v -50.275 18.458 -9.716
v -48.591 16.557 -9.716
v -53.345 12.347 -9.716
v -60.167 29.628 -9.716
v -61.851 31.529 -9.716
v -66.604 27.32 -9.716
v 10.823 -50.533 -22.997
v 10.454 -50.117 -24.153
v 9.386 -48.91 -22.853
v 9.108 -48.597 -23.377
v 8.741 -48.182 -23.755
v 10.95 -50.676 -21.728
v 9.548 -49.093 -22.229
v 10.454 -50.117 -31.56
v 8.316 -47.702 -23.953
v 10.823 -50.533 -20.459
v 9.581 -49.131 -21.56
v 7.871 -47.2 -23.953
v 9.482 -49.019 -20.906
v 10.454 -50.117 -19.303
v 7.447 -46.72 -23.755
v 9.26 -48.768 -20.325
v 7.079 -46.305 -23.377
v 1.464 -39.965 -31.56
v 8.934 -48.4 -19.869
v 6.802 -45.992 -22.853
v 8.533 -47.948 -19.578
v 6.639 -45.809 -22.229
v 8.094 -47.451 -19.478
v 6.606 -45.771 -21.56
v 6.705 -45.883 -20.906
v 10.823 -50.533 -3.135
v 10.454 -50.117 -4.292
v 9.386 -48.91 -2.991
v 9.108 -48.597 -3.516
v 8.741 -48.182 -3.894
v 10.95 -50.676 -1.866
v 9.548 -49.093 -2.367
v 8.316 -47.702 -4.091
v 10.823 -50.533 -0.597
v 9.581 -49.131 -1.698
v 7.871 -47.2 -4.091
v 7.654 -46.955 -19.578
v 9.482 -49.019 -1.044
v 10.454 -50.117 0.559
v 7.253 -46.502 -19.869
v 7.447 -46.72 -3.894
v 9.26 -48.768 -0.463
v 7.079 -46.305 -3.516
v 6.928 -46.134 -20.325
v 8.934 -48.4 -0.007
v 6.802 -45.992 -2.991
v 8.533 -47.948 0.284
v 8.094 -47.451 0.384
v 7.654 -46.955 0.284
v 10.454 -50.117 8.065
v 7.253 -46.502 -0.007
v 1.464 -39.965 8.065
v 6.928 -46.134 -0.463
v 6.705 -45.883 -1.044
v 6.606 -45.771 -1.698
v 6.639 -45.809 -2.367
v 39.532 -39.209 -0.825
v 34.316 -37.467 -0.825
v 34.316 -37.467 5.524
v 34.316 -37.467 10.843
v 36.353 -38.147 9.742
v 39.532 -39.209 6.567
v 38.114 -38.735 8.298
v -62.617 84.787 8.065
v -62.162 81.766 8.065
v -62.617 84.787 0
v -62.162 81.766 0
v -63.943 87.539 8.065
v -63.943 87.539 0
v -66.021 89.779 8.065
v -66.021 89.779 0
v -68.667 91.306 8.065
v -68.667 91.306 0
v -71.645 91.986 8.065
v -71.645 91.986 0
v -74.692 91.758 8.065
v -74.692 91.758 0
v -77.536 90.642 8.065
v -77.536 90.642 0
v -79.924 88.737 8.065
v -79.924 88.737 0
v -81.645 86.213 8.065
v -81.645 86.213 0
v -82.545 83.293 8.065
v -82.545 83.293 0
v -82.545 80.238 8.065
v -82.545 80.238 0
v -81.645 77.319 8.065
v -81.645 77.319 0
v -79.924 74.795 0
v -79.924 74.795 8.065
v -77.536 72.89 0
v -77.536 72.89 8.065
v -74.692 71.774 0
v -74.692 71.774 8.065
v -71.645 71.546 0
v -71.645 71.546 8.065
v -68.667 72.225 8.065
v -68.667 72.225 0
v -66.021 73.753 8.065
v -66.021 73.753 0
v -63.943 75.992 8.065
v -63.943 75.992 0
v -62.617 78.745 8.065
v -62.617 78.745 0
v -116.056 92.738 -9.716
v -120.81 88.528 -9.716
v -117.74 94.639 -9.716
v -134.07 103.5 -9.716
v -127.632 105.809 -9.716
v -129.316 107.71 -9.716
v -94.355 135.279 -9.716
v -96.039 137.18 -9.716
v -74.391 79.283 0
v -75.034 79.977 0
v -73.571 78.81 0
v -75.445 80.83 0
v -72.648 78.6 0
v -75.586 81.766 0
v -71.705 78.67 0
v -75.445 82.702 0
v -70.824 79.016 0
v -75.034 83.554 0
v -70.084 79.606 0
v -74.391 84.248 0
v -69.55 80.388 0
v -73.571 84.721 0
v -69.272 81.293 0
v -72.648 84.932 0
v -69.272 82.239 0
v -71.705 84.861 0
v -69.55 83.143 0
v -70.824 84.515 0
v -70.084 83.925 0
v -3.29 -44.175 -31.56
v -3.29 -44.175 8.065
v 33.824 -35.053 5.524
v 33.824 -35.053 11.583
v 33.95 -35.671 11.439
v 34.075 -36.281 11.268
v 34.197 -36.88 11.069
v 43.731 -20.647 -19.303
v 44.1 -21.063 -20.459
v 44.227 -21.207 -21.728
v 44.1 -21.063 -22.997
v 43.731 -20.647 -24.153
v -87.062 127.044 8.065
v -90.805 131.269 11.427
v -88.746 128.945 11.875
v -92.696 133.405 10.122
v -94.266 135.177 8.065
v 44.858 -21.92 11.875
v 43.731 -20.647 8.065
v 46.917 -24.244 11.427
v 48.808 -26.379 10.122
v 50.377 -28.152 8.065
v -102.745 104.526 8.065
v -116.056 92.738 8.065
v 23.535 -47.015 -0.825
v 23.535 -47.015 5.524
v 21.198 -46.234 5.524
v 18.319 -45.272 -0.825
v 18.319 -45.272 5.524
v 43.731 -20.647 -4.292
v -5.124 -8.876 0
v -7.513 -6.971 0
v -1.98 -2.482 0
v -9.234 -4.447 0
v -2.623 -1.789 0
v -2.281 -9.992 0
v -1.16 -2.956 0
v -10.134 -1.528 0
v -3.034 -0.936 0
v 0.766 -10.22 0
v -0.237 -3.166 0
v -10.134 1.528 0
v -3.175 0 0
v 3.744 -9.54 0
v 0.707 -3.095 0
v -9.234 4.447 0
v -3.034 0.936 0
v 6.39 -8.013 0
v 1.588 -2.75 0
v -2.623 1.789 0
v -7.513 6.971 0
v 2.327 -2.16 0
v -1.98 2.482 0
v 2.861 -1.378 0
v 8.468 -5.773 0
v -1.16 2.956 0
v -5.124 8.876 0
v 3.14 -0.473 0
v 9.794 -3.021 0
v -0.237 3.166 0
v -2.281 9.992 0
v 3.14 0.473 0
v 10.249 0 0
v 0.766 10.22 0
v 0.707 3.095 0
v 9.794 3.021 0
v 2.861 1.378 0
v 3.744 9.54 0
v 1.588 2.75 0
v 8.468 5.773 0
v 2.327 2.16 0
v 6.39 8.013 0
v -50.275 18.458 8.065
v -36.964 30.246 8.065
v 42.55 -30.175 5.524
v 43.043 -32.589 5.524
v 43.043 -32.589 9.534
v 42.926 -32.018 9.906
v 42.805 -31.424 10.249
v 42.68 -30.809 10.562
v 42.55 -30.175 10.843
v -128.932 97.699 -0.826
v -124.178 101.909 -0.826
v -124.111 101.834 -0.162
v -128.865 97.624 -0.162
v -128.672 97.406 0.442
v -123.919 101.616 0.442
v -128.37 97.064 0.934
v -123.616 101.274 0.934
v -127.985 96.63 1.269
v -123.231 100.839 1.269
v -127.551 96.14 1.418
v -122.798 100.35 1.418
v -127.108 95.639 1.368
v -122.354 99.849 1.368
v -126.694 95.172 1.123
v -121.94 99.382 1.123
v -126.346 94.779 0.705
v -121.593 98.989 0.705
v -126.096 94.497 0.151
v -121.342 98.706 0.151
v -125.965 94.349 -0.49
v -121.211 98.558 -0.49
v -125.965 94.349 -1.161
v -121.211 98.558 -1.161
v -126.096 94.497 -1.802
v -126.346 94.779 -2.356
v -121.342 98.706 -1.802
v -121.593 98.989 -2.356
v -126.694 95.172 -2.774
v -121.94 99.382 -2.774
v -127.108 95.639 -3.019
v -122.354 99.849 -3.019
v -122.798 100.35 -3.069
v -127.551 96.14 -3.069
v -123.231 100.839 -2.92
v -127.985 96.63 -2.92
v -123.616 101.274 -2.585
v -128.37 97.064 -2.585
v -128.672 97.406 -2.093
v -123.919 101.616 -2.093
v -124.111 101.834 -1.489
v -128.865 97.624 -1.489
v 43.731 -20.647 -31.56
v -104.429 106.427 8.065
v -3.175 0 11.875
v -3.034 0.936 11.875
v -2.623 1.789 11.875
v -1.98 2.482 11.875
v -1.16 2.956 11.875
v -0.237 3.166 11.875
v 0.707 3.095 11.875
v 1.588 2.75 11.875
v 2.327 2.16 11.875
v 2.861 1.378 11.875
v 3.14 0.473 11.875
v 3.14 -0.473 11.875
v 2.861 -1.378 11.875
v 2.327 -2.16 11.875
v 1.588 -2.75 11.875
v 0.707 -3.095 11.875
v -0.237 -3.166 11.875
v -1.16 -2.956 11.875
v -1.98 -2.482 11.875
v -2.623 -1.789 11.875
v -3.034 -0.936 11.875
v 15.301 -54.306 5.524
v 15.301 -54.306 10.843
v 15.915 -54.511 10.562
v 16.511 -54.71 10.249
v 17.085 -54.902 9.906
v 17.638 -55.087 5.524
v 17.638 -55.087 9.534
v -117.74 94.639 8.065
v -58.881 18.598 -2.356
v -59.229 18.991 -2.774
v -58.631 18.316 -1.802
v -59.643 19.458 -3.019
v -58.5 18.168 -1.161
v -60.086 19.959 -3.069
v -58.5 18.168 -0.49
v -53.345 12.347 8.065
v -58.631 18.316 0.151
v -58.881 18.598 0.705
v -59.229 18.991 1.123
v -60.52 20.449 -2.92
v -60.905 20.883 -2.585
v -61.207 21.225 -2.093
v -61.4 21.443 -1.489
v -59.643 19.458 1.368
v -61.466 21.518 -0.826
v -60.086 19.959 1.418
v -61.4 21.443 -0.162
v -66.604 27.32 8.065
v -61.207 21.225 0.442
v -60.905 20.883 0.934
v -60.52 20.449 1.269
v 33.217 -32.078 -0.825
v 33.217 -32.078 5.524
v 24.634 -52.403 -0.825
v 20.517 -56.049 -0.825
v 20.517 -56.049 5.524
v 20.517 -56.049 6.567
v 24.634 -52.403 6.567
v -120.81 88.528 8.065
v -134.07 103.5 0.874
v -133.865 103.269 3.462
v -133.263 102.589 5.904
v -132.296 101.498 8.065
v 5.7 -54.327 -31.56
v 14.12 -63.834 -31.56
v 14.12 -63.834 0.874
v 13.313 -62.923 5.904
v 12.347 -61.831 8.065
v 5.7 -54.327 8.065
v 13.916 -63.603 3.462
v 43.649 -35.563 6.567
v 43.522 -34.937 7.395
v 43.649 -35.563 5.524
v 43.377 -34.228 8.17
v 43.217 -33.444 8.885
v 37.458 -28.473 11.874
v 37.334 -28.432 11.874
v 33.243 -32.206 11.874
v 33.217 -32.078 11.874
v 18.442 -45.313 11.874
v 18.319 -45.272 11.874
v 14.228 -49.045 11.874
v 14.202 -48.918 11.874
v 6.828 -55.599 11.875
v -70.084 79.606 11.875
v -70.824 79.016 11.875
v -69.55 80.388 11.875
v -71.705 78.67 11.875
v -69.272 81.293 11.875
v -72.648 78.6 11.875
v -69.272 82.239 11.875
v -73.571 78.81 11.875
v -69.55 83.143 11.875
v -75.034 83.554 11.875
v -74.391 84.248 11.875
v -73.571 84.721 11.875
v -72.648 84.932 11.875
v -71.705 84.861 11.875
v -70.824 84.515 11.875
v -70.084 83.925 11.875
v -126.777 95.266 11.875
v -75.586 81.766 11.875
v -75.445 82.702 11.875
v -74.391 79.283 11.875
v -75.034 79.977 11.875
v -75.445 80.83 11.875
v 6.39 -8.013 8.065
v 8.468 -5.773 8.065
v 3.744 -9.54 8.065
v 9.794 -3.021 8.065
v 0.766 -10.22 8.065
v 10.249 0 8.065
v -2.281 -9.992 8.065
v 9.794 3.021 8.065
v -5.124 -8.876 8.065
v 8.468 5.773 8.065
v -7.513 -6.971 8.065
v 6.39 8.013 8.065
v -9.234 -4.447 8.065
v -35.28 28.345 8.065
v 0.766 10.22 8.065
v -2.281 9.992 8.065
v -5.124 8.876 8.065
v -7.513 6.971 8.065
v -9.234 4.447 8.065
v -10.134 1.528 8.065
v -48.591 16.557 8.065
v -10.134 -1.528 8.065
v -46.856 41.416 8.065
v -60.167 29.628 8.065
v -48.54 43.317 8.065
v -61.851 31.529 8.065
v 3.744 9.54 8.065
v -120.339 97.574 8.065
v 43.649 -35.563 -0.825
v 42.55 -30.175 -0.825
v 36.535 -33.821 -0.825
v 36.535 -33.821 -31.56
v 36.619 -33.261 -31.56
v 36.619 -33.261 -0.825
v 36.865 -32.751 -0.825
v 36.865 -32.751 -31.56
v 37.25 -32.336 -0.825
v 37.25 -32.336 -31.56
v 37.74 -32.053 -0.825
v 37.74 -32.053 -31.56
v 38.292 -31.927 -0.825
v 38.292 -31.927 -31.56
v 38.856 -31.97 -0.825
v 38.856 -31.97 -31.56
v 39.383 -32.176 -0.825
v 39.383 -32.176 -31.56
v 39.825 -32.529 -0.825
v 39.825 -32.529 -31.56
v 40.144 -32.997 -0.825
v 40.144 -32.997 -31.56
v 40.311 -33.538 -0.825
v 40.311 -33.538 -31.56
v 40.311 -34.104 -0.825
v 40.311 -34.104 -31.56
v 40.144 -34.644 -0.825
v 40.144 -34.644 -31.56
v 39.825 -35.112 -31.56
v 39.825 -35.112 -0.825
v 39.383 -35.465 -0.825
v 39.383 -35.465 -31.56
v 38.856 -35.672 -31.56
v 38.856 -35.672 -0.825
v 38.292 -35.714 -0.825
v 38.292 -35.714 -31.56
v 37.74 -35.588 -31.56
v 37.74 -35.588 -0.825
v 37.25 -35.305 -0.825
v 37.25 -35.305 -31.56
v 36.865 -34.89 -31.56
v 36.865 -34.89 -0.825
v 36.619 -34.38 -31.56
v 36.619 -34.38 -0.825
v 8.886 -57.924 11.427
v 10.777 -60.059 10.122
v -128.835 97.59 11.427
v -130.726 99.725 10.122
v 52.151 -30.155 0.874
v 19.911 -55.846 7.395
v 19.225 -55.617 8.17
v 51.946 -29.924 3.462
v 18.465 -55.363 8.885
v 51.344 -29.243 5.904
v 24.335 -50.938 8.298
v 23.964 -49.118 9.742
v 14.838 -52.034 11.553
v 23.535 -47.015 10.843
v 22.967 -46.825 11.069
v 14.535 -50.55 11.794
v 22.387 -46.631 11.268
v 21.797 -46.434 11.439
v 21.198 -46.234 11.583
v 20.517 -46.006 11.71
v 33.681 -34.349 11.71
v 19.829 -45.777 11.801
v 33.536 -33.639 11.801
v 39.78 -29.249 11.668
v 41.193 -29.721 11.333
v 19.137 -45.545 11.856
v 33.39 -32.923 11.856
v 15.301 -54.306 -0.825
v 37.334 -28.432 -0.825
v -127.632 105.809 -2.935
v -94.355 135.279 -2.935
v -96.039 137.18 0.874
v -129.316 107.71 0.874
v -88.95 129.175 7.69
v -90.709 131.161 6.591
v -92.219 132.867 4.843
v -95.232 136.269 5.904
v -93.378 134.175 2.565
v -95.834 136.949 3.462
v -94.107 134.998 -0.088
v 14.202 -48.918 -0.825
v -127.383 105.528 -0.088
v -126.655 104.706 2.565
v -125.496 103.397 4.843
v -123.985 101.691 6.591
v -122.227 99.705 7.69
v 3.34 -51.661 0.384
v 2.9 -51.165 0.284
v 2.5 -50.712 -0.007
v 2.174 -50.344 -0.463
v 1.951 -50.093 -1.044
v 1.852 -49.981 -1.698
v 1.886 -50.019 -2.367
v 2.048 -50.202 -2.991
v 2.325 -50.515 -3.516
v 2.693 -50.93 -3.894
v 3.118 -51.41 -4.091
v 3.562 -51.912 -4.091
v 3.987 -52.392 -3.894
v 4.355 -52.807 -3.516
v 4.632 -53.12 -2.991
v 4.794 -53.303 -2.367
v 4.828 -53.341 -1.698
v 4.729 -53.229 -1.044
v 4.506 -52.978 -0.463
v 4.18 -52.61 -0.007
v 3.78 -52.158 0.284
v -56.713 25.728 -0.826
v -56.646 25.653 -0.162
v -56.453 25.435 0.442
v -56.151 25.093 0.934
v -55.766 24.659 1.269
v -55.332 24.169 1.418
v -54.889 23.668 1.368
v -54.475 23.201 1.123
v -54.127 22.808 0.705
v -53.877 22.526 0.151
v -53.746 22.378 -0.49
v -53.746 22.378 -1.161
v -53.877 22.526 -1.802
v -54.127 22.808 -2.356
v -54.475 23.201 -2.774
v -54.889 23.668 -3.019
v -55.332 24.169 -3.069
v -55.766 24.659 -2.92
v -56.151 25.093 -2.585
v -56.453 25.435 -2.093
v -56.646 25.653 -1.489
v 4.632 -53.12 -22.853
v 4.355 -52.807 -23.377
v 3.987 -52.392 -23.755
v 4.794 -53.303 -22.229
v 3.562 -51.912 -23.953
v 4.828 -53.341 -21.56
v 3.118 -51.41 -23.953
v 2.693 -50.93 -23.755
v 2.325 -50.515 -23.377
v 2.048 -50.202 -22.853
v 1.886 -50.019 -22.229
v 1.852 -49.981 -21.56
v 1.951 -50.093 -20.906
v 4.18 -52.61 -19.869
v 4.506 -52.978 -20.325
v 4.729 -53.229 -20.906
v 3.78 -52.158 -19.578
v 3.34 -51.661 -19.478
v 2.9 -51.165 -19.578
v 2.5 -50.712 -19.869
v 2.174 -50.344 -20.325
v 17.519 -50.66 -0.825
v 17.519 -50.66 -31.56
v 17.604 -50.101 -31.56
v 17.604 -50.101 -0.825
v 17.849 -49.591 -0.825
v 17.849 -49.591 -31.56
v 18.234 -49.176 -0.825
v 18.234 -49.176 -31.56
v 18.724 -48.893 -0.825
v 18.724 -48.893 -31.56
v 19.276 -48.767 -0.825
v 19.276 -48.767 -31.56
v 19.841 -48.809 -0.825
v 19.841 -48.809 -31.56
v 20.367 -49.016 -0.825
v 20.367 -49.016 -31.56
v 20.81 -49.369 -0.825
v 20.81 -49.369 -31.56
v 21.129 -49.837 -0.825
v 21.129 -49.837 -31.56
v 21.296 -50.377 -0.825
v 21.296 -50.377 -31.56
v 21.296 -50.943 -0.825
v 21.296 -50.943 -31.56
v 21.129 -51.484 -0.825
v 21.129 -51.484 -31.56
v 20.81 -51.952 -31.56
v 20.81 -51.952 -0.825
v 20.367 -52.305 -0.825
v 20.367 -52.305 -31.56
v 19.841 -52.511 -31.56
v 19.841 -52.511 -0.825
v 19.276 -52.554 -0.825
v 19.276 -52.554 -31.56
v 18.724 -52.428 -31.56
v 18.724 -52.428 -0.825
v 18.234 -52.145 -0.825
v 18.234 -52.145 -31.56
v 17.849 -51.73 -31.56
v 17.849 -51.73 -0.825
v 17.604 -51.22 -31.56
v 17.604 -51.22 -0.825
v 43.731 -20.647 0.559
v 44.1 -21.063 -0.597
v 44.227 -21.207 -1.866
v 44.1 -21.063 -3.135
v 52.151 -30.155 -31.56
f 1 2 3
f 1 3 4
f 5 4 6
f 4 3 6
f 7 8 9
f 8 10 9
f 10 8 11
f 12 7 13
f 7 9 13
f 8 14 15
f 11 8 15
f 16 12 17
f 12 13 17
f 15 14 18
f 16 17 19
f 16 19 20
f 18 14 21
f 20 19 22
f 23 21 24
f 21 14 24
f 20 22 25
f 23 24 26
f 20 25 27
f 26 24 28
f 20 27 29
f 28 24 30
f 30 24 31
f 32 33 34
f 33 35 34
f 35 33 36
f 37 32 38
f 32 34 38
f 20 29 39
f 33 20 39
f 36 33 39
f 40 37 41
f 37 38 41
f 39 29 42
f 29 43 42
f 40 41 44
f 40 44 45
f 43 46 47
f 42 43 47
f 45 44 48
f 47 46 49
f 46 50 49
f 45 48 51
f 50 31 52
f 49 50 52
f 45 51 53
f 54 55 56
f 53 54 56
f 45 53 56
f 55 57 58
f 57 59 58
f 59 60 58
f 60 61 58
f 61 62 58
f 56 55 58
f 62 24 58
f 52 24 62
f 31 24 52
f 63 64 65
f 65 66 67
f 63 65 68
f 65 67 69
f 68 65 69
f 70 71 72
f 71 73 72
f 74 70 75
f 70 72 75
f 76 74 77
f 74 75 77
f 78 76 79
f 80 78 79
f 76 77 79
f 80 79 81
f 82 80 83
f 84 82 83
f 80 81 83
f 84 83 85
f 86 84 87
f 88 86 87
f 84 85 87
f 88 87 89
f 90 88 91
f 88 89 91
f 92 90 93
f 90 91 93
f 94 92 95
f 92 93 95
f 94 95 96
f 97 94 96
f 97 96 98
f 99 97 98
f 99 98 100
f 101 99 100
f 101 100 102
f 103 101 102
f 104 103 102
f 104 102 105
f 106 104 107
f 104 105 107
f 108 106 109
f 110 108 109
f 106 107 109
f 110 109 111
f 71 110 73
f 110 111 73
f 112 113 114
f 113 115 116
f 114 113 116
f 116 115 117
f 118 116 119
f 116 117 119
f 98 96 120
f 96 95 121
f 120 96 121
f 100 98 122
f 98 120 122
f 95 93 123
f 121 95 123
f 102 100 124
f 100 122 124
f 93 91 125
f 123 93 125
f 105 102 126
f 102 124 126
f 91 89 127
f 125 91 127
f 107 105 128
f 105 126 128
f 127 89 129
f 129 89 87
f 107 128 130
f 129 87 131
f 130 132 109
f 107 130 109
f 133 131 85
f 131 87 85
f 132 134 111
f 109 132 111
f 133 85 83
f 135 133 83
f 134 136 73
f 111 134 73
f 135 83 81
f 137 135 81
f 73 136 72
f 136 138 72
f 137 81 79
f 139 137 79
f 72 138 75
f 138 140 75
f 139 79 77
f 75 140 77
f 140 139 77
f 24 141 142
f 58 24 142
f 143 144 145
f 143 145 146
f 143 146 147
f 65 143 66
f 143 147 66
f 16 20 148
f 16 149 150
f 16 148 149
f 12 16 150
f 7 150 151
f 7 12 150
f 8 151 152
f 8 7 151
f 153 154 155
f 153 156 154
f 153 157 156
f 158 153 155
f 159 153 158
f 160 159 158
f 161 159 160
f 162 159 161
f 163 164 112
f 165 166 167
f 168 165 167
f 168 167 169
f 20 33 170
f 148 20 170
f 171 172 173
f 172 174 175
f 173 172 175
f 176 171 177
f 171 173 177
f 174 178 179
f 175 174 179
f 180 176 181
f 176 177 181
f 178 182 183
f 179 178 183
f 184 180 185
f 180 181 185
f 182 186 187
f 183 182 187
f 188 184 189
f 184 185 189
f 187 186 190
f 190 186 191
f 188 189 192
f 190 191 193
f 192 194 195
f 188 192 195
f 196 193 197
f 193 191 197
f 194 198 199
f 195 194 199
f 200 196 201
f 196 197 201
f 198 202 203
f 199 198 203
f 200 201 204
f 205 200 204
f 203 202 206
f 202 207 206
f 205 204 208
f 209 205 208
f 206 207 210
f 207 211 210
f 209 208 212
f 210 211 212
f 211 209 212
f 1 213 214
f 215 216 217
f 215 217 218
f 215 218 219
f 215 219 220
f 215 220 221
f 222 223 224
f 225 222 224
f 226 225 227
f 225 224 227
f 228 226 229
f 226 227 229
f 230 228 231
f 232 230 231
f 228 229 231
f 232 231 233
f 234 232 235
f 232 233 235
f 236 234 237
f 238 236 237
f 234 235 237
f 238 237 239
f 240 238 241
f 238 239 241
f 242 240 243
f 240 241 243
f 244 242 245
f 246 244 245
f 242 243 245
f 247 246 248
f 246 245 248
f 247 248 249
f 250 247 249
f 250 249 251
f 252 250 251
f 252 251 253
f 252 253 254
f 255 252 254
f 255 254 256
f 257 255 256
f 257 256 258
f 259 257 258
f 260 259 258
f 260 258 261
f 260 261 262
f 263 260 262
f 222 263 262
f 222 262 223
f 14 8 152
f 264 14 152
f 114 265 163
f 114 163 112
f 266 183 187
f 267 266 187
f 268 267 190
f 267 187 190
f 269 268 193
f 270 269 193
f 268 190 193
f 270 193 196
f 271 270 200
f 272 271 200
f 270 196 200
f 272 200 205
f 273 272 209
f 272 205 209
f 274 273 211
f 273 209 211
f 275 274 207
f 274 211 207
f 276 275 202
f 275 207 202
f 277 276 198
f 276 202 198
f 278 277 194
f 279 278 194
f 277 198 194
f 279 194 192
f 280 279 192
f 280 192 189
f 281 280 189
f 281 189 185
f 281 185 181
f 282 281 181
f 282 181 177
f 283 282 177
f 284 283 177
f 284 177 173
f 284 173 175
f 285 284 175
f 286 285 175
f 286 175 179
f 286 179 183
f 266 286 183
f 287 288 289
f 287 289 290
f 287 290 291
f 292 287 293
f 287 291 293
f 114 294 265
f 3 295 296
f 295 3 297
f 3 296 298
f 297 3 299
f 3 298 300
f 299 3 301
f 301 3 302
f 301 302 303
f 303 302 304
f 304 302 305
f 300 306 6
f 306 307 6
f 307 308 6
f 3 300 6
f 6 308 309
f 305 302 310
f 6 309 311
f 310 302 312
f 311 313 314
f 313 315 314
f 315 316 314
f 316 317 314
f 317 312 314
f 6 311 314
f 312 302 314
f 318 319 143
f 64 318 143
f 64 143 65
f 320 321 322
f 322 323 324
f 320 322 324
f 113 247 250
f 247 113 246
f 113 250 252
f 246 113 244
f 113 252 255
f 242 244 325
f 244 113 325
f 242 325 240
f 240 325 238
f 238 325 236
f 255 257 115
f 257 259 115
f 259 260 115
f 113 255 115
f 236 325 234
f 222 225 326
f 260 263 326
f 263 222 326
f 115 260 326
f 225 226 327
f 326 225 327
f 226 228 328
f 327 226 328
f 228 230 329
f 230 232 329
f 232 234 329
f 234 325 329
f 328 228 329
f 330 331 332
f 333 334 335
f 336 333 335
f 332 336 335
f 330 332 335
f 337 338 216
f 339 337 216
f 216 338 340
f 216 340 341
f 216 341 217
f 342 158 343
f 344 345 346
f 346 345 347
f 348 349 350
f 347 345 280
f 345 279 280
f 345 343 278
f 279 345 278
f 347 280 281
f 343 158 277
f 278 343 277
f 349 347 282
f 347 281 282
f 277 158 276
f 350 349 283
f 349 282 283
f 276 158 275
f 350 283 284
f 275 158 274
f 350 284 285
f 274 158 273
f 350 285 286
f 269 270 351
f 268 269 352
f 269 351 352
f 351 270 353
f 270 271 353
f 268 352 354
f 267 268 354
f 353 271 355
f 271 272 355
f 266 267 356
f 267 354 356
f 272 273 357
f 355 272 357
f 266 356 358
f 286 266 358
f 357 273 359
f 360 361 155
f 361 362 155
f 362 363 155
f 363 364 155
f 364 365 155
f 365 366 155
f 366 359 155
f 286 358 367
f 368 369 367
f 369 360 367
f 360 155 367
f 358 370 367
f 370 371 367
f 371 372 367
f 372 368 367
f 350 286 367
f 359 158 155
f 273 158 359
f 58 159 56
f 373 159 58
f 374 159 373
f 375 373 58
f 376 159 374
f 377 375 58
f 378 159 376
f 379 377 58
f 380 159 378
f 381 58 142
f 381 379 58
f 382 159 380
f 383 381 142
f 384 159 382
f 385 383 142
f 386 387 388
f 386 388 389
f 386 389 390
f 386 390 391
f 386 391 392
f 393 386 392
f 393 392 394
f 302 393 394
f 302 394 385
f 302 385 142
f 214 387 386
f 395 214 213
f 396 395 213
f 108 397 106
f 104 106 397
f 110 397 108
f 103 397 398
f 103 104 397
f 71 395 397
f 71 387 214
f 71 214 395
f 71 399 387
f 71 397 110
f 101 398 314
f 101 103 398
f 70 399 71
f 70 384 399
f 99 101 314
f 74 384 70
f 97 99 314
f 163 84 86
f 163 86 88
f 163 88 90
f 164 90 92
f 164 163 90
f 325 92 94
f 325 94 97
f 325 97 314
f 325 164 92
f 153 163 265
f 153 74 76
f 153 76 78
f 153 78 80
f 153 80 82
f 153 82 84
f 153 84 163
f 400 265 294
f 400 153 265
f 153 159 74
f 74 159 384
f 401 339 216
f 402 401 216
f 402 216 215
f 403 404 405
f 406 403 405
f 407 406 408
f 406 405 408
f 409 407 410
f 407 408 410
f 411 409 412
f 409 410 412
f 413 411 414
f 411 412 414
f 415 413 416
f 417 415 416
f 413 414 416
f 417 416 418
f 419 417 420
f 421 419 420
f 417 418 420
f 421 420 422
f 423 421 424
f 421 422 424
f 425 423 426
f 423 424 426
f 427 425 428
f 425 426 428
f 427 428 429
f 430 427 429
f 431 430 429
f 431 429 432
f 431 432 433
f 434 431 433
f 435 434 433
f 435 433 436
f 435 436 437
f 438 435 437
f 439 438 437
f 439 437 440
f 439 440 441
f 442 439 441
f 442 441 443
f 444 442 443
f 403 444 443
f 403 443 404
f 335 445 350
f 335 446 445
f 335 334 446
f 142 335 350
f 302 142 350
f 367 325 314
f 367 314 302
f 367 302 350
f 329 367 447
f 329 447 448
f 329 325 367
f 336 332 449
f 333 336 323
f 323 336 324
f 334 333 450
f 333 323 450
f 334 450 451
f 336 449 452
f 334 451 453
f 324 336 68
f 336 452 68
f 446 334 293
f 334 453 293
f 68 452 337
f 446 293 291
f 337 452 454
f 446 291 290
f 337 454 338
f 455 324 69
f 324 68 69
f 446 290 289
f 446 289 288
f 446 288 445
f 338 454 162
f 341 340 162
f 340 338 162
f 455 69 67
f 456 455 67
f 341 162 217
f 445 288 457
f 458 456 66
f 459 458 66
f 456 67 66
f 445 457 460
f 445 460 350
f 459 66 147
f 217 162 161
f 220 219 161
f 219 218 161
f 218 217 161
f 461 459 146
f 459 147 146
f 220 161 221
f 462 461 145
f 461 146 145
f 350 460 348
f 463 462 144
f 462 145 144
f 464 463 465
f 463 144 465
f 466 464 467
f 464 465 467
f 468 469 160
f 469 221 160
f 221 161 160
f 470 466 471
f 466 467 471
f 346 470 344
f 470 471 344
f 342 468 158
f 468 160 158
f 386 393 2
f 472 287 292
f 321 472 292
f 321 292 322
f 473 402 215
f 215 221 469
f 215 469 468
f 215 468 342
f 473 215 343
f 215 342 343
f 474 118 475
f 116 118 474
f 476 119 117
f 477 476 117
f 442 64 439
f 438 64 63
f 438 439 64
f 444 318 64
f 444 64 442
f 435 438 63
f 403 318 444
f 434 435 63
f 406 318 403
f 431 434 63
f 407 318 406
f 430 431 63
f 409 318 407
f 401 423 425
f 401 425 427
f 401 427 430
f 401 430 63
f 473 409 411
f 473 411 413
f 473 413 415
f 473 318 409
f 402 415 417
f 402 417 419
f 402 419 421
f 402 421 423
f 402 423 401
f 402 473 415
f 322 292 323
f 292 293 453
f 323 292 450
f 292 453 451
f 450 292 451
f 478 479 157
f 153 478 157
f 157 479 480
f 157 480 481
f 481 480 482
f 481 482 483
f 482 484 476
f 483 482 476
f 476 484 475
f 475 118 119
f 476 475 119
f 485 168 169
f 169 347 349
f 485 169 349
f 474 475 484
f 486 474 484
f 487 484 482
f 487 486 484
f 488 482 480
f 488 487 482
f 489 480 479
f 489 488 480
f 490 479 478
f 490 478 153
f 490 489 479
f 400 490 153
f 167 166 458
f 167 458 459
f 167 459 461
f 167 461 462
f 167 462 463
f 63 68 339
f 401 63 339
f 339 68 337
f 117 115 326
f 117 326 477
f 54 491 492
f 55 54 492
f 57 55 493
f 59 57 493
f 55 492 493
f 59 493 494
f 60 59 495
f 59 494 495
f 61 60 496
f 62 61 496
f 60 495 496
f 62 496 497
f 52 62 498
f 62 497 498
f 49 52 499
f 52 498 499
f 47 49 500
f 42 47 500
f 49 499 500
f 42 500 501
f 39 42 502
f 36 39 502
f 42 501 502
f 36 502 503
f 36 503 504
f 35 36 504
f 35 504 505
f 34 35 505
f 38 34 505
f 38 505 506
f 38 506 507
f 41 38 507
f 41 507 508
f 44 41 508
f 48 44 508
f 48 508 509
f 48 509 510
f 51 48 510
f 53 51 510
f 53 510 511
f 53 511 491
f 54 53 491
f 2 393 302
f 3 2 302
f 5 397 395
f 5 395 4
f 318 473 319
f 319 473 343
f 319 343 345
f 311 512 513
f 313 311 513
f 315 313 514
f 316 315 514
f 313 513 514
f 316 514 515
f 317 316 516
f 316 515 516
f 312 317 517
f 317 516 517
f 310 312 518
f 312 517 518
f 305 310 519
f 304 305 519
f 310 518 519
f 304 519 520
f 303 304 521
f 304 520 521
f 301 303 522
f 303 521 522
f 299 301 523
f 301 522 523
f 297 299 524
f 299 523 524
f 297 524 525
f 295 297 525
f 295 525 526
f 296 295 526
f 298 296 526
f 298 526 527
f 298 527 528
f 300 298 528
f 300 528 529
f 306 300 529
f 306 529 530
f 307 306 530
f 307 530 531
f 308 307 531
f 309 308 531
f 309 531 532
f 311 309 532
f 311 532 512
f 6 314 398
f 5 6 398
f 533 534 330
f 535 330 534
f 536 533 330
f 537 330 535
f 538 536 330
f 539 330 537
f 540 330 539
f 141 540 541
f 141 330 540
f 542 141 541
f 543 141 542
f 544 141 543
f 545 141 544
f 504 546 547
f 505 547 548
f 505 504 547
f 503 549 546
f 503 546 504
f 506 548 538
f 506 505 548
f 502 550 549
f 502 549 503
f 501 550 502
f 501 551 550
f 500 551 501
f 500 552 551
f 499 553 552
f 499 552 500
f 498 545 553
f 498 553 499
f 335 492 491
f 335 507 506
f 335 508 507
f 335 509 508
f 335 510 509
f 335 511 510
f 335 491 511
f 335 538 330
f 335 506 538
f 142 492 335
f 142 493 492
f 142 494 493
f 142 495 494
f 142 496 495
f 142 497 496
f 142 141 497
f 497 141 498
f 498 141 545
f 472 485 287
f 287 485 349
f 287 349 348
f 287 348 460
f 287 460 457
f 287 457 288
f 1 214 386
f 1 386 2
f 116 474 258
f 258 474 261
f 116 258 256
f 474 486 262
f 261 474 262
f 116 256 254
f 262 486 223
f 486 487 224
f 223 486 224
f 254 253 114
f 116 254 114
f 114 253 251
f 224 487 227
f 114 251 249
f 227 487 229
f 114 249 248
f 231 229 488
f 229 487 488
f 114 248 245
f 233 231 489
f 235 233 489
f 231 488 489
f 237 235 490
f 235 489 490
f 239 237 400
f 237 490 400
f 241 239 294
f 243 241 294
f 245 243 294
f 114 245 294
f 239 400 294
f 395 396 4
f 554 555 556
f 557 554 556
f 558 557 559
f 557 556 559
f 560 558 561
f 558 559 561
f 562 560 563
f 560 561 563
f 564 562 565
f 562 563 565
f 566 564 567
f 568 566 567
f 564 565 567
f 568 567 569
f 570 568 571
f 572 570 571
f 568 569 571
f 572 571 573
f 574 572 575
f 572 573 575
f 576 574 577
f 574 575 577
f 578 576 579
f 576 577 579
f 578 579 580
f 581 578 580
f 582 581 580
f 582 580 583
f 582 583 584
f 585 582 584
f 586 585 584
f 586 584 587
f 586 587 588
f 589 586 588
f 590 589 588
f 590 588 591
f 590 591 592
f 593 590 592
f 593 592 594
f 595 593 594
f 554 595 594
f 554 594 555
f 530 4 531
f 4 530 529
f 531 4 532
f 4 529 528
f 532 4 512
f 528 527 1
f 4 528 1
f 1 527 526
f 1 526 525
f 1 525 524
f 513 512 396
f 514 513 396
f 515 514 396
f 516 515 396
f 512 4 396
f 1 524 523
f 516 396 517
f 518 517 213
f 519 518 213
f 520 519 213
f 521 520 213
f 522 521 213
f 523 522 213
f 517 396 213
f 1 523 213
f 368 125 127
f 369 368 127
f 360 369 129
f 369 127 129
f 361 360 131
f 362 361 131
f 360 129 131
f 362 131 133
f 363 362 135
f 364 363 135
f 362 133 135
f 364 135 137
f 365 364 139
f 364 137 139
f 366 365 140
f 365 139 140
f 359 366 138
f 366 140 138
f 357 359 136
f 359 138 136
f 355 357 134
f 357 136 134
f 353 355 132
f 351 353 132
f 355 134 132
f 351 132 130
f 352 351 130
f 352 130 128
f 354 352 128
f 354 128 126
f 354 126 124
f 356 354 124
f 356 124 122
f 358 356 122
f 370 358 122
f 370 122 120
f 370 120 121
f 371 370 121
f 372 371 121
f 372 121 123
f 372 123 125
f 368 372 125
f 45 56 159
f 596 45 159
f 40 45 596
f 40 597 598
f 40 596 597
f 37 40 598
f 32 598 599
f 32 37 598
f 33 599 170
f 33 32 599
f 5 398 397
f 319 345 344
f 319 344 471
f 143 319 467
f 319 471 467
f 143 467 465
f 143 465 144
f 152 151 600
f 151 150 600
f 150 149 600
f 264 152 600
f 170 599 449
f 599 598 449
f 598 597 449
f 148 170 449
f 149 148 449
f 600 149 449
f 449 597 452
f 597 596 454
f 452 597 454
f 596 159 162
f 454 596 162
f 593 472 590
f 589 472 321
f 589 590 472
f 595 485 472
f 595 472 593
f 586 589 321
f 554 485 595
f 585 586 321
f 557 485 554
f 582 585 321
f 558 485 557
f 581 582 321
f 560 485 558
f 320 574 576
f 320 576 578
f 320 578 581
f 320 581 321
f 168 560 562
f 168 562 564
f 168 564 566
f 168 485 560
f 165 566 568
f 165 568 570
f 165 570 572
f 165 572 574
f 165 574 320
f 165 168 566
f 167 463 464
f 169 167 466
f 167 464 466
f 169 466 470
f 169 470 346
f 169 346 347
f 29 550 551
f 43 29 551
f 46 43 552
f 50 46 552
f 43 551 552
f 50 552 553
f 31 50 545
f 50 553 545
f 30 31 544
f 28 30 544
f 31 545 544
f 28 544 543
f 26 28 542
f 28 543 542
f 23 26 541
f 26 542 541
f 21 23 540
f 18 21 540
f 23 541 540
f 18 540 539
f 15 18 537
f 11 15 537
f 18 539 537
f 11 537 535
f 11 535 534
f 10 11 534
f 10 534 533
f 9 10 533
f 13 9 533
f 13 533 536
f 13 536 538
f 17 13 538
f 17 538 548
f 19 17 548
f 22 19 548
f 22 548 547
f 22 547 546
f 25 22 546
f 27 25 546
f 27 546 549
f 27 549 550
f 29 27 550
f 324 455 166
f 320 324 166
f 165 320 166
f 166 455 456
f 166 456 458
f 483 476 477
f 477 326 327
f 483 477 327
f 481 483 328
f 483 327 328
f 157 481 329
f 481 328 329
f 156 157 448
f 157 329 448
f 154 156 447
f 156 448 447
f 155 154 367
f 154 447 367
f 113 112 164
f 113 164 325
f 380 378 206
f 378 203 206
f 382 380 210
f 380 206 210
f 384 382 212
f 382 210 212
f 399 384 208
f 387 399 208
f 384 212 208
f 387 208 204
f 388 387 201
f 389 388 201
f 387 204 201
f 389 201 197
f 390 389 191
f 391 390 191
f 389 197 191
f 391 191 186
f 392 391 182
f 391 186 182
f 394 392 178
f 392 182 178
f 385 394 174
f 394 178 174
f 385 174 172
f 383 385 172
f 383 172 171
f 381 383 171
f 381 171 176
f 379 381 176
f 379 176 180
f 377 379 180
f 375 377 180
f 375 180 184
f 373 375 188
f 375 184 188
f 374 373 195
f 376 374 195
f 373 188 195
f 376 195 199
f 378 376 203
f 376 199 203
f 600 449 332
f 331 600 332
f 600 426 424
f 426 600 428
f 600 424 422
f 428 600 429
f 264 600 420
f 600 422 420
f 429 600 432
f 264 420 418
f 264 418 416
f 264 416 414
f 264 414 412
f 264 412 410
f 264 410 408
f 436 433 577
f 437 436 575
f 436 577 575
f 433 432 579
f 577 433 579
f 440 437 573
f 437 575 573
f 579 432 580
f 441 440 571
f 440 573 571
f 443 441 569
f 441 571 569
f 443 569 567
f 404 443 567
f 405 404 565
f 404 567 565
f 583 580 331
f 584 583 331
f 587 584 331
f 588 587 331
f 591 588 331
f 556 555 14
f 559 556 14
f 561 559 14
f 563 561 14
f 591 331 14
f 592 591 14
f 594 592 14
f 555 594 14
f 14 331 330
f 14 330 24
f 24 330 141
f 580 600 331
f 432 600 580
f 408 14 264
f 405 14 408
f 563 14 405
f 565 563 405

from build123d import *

# Parameters (mm, degrees)
SKETCH1_R                   = 10.2489
BOSS_EXTRUDE1_DEPTH         = 2.9845
BOSS_EXTRUDE1_2_DEPTH       = 2.9845
SKETCH2_R                   = 10.2489
BOSS_EXTRUDE2_DEPTH         = 5.08
BOSS_EXTRUDE3_DEPTH         = 3.81
F_1_4_0_25_DIAMETER_HOLE1_D = 6.35
BOSS_EXTRUDE4_DEPTH         = 17.78
SKETCH8_R                   = 2.25
CUT_EXTRUDE1_DEPTH          = 17.78
SKETCH9_W                   = 17.78
SKETCH9_H                   = 2.54
BOSS_EXTRUDE5_DEPTH         = 17.78
CUT_EXTRUDE2_REACH          = 251.039
CUT_EXTRUDE3_DEPTH          = 20
BOSS_EXTRUDE6_DEPTH         = 2.54
BOSS_EXTRUDE7_DEPTH         = 39.624
CUT_EXTRUDE5_DEPTH          = 6.35
F_6_CLEARANCE_HOLE1_D       = 3.7973
SKETCH19_W                  = 39.624
SKETCH19_H                  = 13.560471889
BOSS_EXTRUDE8_DEPTH         = 6.35
M4_CLEARANCE_HOLE1_D        = 4.5
SKETCH20_R                  = 4.308
CUT_EXTRUDE6_DEPTH          = 195.822050963
FILLET1_R                   = 11
CUT_EXTRUDE7_DEPTH          = 6.35


with BuildPart() as part:
    # Sketch1 → Boss-Extrude1 (new body)
    with BuildSketch(Plane.XY):
        Circle(SKETCH1_R)
    extrude(amount=BOSS_EXTRUDE1_DEPTH)



with BuildPart() as body_2:
    # Sketch1 → Boss-Extrude1 2 (new body)
    with BuildSketch(Plane.XY):
        with Locations((-72.411066703, 81.765798589)):
            Circle(SKETCH1_R)
    extrude(amount=BOSS_EXTRUDE1_2_DEPTH)


with BuildPart() as part_1:
    add(part.part)

    add(body_2.part)  # Boss-Extrude2 merges body 2
    # Sketch2 → Boss-Extrude2 (add)
    with BuildSketch(Plane.XY.offset(2.9845)):
        with Locations((-72.411066703, 81.765798589)):
            Circle(SKETCH2_R)
        Circle(SKETCH2_R)
    extrude(amount=BOSS_EXTRUDE2_DEPTH)

    # Sketch3 → Boss-Extrude3 (add)
    with BuildSketch(Plane.XY.offset(8.0645)):
        Polygon((-134.069705847, 103.500499391), (-96.039101852, 137.180065299), (52.150988145, -30.154592279), (14.12038415, -63.834158187), align=None)
    extrude(amount=BOSS_EXTRUDE3_DEPTH)

    # 1/4 (0.25) Diameter Hole1 (through all)
    with Locations(Plane.XY.offset(11.8745)):
        with Locations((0, 0), (-72.411066703, 81.765798589)):
            Hole(F_1_4_0_25_DIAMETER_HOLE1_D / 2)

    # Sketch7 → Boss-Extrude4 (add)
    with BuildSketch(Plane(origin=(0, 0, 8.0645), x_dir=(-1, 0, 0), z_dir=(0, 0, -1))):
        Polygon((53.34482504, 12.346831233), (66.604496657, 27.319509971), (61.850671158, 31.529455709), (48.59099954, 16.556776971), align=None)
        Polygon((120.810034229, 88.527820652), (134.069705847, 103.500499391), (129.315880348, 107.710445129), (116.05620873, 92.737766391), align=None)
    extrude(amount=BOSS_EXTRUDE4_DEPTH)

    # Sketch8 → Cut-Extrude1 (cut)
    with BuildSketch(Plane(origin=(-19.015301997, -16.839782954, 0), x_dir=(0, 0, -1), z_dir=(0.7486339369082552, 0.6629835808745542, 0))):
        with Locations(Location((0.8255, 54.61, 0), (0, 0, 90))):
            Circle(SKETCH8_R)
        with Locations(Location((0.8255, 156.37, 0), (0, 0, 90))):
            Circle(SKETCH8_R)
    extrude(amount=-CUT_EXTRUDE1_DEPTH, mode=Mode.SUBTRACT)

    # Sketch9 → Boss-Extrude5 (add)
    with BuildSketch(Plane(origin=(-19.015301997, -16.839782954, 0), x_dir=(0, 0, -1), z_dir=(0.7486339369082552, 0.6629835808745542, 0))):
        with Locations((0.8255, 63.34)):
            Rectangle(SKETCH9_W, SKETCH9_H)
        with Locations((0.8255, 45.88)):
            Rectangle(SKETCH9_W, SKETCH9_H)
        with Locations((0.8255, 165.1)):
            Rectangle(SKETCH9_W, SKETCH9_H)
        with Locations((0.8255, 147.64)):
            Rectangle(SKETCH9_W, SKETCH9_H)
    extrude(amount=BOSS_EXTRUDE5_DEPTH)

    # Cut-Extrude2: up to this face of the body (flat: up to its plane)
    cut_extrude2_end = Plane(part_1.part.faces().sort_by_distance((-111.777765781, 96.526717556, -0.8255))[0])
    # Sketch10 → Cut-Extrude2 (cut, up to the picked face)
    with BuildSketch(Plane(origin=(-110.30057835, 124.550228083, 0), x_dir=(0.7486339369082557, 0.6629835808745536, 0), z_dir=(-0.6629835808745536, 0.7486339369082557, 0)), mode=Mode.PRIVATE) as cut_extrude2_sk1:
        Polygon((-7.62, 9.7155), (-7.62, -8.0645), (-25.4, 9.7155), align=None)
    cut_extrude2_tool1 = split(extrude(cut_extrude2_sk1.sketch, amount=-CUT_EXTRUDE2_REACH, mode=Mode.PRIVATE), bisect_by=cut_extrude2_end, keep=Keep.BOTH, mode=Mode.PRIVATE)
    add(cut_extrude2_tool1.solids().sort_by(Axis((-120.442073, 115.569011, -3.788833), (0.6629835808745536, -0.7486339369082557, 0)))[0], mode=Mode.SUBTRACT)

    # Sketch11 → Cut-Extrude3 (cut)
    with BuildSketch(Plane(origin=(-42.83536916, 48.369238664, 0), x_dir=(0.7486339369082559, 0.6629835808745536, 0), z_dir=(-0.6629835808745536, 0.7486339369082559, 0))):
        Polygon((-7.62, 9.7155), (-7.62, -8.0645), (-25.4, 9.7155), align=None)
    extrude(amount=-CUT_EXTRUDE3_DEPTH, mode=Mode.SUBTRACT)

    # Sketch13 → Boss-Extrude6 (add)
    with BuildSketch(Plane(origin=(-110.30057835, 124.550228083, 0), x_dir=(0.7486339369082557, 0.6629835808745536, 0), z_dir=(-0.6629835808745536, 0.7486339369082557, 0))):
        Polygon((-25.4, 9.7155), (19.05, 9.7155), (19.05, -8.0645), (-7.62, -8.0645), align=None)
    extrude(amount=-BOSS_EXTRUDE6_DEPTH)

    # Sketch14 → Boss-Extrude7 (add)
    with BuildSketch(Plane(origin=(0, 0, 8.0645), x_dir=(-1, 0, 0), z_dir=(0, 0, -1))):
        Polygon((-52.150988145, -30.154592279), (-14.12038415, -63.834158187), (-5.700492673, -54.326507188), (-43.731096668, -20.64694128), align=None)
    extrude(amount=BOSS_EXTRUDE7_DEPTH)

    # Sketch15 → Cut-Extrude5 (cut)
    with BuildSketch(Plane.XY.offset(11.8745)):
        Polygon((38.433391408, -33.820658256), (42.550325055, -30.174738298), (37.334398928, -28.432329153), (33.21746528, -32.078249111), (33.824088825, -35.052507224), align=None)
        Polygon((43.649317536, -35.563067402), (43.042693991, -32.588809289), (38.433391408, -33.820658256), (34.31645776, -37.466578215), (39.532383888, -39.20898736), align=None)
        Polygon((38.433391408, -33.820658256), (43.042693991, -32.588809289), (42.550325055, -30.174738298), align=None)
        Polygon((34.31645776, -37.466578215), (38.433391408, -33.820658256), (33.824088825, -35.052507224), align=None)
        Polygon((21.198191786, -46.233889763), (19.41808941, -50.660441211), (23.535023058, -47.014521252), align=None)
        Polygon((15.301155763, -54.306361169), (17.637987035, -55.086992658), (19.41808941, -50.660441211), align=None)
        Polygon((14.202163283, -48.918032065), (15.301155763, -54.306361169), (19.41808941, -50.660441211), (21.198191786, -46.233889763), (18.31909693, -45.272112107), align=None)
        Polygon((19.41808941, -50.660441211), (17.637987035, -55.086992658), (20.51708189, -56.048770314), (24.634015538, -52.402850356), (23.535023058, -47.014521252), align=None)
    extrude(amount=-CUT_EXTRUDE5_DEPTH, mode=Mode.SUBTRACT)

    # #6 Clearance Hole1 (through all)
    with Locations(Plane.XY.offset(5.5245)):
        with Locations((19.41808941, -50.660441211), (38.433391408, -33.820658256)):
            Hole(F_6_CLEARANCE_HOLE1_D / 2)

    # Sketch19 → Boss-Extrude8 (add)
    with BuildSketch(Plane(origin=(-23.769127497, -21.049728693, 0), x_dir=(0, 0, 1), z_dir=(-0.7486339369082559, -0.6629835808745536, 0))):
        with Locations((-11.7475, -37.669764056)):
            Rectangle(SKETCH19_W, SKETCH19_H)
    extrude(amount=-BOSS_EXTRUDE8_DEPTH)

    # M4 Clearance Hole1 (through all)
    with Locations(Plane(origin=(-19.015301997, -16.839782954, 0), x_dir=(0, 0, -1), z_dir=(0.7486339369082555, 0.6629835808745539, 0))):
        with Locations((1.866346616, -40.889528111), (21.728039849, -40.889528111)):
            Hole(M4_CLEARANCE_HOLE1_D / 2)

    # Sketch20 → Cut-Extrude6 (cut, through all)
    with BuildSketch(Plane(origin=(-19.015301997, -16.839782954, 0), x_dir=(0, 0, -1), z_dir=(0.7486339369082555, 0.6629835808745539, 0))):
        with Locations((21.728039849, -40.889528111)):
            Circle(SKETCH20_R)
        with Locations((1.866346616, -40.889528111)):
            Circle(SKETCH20_R)
    extrude(amount=CUT_EXTRUDE6_DEPTH, mode=Mode.SUBTRACT)

    # Fillet1
    # the kernel refuses this fillet: 11 mm, written as the material it adds along each edge
    with BuildSketch(Plane(origin=(-127.631902052, 105.808914929, 8.0645), x_dir=(0.6629835808745532, -0.7486339369082561, 1.2918958832001814e-15), z_dir=(0.7486339369082562, 0.6629835808745532, 0))) as fillet1_piece_1:
        with BuildLine():
            CenterArc((FILLET1_R, FILLET1_R), FILLET1_R, 180, 90)
            Line((0, FILLET1_R), (0, 0))
            Line((0, 0), (FILLET1_R, 0))
        make_face()
    extrude(amount=44.45)
    # the kernel refuses this fillet: 11 mm, written as the material it takes off along each edge
    with BuildSketch(Plane(origin=(-154.657139112, 85.268450917, 11.8745), x_dir=(0, 0, -1), z_dir=(0.7486339369082557, 0.6629835808745537, 0))) as fillet1_2_piece_1:
        with BuildLine():
            CenterArc((FILLET1_R, -FILLET1_R), FILLET1_R, 90, 90)
            Line((0, -FILLET1_R), (0, 0))
            Line((0, 0), (FILLET1_R, 0))
        make_face()
    extrude(amount=105.8, mode=Mode.SUBTRACT)
    with BuildSketch(Plane(origin=(72.73842141, -11.922543805, 11.8745), x_dir=(-0.6629835808745536, 0.7486339369082557, 0), z_dir=(-0.7486339369082559, -0.6629835808745537, 0))) as fillet1_2_piece_2:
        with BuildLine():
            CenterArc((FILLET1_R, FILLET1_R), FILLET1_R, 180, 90)
            Line((0, FILLET1_R), (0, 0))
            Line((0, 0), (FILLET1_R, 0))
        make_face()
    extrude(amount=105.8, mode=Mode.SUBTRACT)

    # Sketch23 → Cut-Extrude7 (cut)
    with BuildSketch(Plane.XY.offset(5.5245)):
        Polygon((37.334398928, -28.432329153), (33.21746528, -32.078249111), (34.31645776, -37.466578215), (39.532383888, -39.20898736), (43.649317536, -35.563067402), (42.550325055, -30.174738298), align=None)
        Polygon((14.202163283, -48.918032065), (15.301155763, -54.306361169), (20.51708189, -56.048770314), (24.634015538, -52.402850356), (23.535023058, -47.014521252), (18.31909693, -45.272112107), align=None)
    extrude(amount=-CUT_EXTRUDE7_DEPTH, mode=Mode.SUBTRACT)


solid = part_1.part
